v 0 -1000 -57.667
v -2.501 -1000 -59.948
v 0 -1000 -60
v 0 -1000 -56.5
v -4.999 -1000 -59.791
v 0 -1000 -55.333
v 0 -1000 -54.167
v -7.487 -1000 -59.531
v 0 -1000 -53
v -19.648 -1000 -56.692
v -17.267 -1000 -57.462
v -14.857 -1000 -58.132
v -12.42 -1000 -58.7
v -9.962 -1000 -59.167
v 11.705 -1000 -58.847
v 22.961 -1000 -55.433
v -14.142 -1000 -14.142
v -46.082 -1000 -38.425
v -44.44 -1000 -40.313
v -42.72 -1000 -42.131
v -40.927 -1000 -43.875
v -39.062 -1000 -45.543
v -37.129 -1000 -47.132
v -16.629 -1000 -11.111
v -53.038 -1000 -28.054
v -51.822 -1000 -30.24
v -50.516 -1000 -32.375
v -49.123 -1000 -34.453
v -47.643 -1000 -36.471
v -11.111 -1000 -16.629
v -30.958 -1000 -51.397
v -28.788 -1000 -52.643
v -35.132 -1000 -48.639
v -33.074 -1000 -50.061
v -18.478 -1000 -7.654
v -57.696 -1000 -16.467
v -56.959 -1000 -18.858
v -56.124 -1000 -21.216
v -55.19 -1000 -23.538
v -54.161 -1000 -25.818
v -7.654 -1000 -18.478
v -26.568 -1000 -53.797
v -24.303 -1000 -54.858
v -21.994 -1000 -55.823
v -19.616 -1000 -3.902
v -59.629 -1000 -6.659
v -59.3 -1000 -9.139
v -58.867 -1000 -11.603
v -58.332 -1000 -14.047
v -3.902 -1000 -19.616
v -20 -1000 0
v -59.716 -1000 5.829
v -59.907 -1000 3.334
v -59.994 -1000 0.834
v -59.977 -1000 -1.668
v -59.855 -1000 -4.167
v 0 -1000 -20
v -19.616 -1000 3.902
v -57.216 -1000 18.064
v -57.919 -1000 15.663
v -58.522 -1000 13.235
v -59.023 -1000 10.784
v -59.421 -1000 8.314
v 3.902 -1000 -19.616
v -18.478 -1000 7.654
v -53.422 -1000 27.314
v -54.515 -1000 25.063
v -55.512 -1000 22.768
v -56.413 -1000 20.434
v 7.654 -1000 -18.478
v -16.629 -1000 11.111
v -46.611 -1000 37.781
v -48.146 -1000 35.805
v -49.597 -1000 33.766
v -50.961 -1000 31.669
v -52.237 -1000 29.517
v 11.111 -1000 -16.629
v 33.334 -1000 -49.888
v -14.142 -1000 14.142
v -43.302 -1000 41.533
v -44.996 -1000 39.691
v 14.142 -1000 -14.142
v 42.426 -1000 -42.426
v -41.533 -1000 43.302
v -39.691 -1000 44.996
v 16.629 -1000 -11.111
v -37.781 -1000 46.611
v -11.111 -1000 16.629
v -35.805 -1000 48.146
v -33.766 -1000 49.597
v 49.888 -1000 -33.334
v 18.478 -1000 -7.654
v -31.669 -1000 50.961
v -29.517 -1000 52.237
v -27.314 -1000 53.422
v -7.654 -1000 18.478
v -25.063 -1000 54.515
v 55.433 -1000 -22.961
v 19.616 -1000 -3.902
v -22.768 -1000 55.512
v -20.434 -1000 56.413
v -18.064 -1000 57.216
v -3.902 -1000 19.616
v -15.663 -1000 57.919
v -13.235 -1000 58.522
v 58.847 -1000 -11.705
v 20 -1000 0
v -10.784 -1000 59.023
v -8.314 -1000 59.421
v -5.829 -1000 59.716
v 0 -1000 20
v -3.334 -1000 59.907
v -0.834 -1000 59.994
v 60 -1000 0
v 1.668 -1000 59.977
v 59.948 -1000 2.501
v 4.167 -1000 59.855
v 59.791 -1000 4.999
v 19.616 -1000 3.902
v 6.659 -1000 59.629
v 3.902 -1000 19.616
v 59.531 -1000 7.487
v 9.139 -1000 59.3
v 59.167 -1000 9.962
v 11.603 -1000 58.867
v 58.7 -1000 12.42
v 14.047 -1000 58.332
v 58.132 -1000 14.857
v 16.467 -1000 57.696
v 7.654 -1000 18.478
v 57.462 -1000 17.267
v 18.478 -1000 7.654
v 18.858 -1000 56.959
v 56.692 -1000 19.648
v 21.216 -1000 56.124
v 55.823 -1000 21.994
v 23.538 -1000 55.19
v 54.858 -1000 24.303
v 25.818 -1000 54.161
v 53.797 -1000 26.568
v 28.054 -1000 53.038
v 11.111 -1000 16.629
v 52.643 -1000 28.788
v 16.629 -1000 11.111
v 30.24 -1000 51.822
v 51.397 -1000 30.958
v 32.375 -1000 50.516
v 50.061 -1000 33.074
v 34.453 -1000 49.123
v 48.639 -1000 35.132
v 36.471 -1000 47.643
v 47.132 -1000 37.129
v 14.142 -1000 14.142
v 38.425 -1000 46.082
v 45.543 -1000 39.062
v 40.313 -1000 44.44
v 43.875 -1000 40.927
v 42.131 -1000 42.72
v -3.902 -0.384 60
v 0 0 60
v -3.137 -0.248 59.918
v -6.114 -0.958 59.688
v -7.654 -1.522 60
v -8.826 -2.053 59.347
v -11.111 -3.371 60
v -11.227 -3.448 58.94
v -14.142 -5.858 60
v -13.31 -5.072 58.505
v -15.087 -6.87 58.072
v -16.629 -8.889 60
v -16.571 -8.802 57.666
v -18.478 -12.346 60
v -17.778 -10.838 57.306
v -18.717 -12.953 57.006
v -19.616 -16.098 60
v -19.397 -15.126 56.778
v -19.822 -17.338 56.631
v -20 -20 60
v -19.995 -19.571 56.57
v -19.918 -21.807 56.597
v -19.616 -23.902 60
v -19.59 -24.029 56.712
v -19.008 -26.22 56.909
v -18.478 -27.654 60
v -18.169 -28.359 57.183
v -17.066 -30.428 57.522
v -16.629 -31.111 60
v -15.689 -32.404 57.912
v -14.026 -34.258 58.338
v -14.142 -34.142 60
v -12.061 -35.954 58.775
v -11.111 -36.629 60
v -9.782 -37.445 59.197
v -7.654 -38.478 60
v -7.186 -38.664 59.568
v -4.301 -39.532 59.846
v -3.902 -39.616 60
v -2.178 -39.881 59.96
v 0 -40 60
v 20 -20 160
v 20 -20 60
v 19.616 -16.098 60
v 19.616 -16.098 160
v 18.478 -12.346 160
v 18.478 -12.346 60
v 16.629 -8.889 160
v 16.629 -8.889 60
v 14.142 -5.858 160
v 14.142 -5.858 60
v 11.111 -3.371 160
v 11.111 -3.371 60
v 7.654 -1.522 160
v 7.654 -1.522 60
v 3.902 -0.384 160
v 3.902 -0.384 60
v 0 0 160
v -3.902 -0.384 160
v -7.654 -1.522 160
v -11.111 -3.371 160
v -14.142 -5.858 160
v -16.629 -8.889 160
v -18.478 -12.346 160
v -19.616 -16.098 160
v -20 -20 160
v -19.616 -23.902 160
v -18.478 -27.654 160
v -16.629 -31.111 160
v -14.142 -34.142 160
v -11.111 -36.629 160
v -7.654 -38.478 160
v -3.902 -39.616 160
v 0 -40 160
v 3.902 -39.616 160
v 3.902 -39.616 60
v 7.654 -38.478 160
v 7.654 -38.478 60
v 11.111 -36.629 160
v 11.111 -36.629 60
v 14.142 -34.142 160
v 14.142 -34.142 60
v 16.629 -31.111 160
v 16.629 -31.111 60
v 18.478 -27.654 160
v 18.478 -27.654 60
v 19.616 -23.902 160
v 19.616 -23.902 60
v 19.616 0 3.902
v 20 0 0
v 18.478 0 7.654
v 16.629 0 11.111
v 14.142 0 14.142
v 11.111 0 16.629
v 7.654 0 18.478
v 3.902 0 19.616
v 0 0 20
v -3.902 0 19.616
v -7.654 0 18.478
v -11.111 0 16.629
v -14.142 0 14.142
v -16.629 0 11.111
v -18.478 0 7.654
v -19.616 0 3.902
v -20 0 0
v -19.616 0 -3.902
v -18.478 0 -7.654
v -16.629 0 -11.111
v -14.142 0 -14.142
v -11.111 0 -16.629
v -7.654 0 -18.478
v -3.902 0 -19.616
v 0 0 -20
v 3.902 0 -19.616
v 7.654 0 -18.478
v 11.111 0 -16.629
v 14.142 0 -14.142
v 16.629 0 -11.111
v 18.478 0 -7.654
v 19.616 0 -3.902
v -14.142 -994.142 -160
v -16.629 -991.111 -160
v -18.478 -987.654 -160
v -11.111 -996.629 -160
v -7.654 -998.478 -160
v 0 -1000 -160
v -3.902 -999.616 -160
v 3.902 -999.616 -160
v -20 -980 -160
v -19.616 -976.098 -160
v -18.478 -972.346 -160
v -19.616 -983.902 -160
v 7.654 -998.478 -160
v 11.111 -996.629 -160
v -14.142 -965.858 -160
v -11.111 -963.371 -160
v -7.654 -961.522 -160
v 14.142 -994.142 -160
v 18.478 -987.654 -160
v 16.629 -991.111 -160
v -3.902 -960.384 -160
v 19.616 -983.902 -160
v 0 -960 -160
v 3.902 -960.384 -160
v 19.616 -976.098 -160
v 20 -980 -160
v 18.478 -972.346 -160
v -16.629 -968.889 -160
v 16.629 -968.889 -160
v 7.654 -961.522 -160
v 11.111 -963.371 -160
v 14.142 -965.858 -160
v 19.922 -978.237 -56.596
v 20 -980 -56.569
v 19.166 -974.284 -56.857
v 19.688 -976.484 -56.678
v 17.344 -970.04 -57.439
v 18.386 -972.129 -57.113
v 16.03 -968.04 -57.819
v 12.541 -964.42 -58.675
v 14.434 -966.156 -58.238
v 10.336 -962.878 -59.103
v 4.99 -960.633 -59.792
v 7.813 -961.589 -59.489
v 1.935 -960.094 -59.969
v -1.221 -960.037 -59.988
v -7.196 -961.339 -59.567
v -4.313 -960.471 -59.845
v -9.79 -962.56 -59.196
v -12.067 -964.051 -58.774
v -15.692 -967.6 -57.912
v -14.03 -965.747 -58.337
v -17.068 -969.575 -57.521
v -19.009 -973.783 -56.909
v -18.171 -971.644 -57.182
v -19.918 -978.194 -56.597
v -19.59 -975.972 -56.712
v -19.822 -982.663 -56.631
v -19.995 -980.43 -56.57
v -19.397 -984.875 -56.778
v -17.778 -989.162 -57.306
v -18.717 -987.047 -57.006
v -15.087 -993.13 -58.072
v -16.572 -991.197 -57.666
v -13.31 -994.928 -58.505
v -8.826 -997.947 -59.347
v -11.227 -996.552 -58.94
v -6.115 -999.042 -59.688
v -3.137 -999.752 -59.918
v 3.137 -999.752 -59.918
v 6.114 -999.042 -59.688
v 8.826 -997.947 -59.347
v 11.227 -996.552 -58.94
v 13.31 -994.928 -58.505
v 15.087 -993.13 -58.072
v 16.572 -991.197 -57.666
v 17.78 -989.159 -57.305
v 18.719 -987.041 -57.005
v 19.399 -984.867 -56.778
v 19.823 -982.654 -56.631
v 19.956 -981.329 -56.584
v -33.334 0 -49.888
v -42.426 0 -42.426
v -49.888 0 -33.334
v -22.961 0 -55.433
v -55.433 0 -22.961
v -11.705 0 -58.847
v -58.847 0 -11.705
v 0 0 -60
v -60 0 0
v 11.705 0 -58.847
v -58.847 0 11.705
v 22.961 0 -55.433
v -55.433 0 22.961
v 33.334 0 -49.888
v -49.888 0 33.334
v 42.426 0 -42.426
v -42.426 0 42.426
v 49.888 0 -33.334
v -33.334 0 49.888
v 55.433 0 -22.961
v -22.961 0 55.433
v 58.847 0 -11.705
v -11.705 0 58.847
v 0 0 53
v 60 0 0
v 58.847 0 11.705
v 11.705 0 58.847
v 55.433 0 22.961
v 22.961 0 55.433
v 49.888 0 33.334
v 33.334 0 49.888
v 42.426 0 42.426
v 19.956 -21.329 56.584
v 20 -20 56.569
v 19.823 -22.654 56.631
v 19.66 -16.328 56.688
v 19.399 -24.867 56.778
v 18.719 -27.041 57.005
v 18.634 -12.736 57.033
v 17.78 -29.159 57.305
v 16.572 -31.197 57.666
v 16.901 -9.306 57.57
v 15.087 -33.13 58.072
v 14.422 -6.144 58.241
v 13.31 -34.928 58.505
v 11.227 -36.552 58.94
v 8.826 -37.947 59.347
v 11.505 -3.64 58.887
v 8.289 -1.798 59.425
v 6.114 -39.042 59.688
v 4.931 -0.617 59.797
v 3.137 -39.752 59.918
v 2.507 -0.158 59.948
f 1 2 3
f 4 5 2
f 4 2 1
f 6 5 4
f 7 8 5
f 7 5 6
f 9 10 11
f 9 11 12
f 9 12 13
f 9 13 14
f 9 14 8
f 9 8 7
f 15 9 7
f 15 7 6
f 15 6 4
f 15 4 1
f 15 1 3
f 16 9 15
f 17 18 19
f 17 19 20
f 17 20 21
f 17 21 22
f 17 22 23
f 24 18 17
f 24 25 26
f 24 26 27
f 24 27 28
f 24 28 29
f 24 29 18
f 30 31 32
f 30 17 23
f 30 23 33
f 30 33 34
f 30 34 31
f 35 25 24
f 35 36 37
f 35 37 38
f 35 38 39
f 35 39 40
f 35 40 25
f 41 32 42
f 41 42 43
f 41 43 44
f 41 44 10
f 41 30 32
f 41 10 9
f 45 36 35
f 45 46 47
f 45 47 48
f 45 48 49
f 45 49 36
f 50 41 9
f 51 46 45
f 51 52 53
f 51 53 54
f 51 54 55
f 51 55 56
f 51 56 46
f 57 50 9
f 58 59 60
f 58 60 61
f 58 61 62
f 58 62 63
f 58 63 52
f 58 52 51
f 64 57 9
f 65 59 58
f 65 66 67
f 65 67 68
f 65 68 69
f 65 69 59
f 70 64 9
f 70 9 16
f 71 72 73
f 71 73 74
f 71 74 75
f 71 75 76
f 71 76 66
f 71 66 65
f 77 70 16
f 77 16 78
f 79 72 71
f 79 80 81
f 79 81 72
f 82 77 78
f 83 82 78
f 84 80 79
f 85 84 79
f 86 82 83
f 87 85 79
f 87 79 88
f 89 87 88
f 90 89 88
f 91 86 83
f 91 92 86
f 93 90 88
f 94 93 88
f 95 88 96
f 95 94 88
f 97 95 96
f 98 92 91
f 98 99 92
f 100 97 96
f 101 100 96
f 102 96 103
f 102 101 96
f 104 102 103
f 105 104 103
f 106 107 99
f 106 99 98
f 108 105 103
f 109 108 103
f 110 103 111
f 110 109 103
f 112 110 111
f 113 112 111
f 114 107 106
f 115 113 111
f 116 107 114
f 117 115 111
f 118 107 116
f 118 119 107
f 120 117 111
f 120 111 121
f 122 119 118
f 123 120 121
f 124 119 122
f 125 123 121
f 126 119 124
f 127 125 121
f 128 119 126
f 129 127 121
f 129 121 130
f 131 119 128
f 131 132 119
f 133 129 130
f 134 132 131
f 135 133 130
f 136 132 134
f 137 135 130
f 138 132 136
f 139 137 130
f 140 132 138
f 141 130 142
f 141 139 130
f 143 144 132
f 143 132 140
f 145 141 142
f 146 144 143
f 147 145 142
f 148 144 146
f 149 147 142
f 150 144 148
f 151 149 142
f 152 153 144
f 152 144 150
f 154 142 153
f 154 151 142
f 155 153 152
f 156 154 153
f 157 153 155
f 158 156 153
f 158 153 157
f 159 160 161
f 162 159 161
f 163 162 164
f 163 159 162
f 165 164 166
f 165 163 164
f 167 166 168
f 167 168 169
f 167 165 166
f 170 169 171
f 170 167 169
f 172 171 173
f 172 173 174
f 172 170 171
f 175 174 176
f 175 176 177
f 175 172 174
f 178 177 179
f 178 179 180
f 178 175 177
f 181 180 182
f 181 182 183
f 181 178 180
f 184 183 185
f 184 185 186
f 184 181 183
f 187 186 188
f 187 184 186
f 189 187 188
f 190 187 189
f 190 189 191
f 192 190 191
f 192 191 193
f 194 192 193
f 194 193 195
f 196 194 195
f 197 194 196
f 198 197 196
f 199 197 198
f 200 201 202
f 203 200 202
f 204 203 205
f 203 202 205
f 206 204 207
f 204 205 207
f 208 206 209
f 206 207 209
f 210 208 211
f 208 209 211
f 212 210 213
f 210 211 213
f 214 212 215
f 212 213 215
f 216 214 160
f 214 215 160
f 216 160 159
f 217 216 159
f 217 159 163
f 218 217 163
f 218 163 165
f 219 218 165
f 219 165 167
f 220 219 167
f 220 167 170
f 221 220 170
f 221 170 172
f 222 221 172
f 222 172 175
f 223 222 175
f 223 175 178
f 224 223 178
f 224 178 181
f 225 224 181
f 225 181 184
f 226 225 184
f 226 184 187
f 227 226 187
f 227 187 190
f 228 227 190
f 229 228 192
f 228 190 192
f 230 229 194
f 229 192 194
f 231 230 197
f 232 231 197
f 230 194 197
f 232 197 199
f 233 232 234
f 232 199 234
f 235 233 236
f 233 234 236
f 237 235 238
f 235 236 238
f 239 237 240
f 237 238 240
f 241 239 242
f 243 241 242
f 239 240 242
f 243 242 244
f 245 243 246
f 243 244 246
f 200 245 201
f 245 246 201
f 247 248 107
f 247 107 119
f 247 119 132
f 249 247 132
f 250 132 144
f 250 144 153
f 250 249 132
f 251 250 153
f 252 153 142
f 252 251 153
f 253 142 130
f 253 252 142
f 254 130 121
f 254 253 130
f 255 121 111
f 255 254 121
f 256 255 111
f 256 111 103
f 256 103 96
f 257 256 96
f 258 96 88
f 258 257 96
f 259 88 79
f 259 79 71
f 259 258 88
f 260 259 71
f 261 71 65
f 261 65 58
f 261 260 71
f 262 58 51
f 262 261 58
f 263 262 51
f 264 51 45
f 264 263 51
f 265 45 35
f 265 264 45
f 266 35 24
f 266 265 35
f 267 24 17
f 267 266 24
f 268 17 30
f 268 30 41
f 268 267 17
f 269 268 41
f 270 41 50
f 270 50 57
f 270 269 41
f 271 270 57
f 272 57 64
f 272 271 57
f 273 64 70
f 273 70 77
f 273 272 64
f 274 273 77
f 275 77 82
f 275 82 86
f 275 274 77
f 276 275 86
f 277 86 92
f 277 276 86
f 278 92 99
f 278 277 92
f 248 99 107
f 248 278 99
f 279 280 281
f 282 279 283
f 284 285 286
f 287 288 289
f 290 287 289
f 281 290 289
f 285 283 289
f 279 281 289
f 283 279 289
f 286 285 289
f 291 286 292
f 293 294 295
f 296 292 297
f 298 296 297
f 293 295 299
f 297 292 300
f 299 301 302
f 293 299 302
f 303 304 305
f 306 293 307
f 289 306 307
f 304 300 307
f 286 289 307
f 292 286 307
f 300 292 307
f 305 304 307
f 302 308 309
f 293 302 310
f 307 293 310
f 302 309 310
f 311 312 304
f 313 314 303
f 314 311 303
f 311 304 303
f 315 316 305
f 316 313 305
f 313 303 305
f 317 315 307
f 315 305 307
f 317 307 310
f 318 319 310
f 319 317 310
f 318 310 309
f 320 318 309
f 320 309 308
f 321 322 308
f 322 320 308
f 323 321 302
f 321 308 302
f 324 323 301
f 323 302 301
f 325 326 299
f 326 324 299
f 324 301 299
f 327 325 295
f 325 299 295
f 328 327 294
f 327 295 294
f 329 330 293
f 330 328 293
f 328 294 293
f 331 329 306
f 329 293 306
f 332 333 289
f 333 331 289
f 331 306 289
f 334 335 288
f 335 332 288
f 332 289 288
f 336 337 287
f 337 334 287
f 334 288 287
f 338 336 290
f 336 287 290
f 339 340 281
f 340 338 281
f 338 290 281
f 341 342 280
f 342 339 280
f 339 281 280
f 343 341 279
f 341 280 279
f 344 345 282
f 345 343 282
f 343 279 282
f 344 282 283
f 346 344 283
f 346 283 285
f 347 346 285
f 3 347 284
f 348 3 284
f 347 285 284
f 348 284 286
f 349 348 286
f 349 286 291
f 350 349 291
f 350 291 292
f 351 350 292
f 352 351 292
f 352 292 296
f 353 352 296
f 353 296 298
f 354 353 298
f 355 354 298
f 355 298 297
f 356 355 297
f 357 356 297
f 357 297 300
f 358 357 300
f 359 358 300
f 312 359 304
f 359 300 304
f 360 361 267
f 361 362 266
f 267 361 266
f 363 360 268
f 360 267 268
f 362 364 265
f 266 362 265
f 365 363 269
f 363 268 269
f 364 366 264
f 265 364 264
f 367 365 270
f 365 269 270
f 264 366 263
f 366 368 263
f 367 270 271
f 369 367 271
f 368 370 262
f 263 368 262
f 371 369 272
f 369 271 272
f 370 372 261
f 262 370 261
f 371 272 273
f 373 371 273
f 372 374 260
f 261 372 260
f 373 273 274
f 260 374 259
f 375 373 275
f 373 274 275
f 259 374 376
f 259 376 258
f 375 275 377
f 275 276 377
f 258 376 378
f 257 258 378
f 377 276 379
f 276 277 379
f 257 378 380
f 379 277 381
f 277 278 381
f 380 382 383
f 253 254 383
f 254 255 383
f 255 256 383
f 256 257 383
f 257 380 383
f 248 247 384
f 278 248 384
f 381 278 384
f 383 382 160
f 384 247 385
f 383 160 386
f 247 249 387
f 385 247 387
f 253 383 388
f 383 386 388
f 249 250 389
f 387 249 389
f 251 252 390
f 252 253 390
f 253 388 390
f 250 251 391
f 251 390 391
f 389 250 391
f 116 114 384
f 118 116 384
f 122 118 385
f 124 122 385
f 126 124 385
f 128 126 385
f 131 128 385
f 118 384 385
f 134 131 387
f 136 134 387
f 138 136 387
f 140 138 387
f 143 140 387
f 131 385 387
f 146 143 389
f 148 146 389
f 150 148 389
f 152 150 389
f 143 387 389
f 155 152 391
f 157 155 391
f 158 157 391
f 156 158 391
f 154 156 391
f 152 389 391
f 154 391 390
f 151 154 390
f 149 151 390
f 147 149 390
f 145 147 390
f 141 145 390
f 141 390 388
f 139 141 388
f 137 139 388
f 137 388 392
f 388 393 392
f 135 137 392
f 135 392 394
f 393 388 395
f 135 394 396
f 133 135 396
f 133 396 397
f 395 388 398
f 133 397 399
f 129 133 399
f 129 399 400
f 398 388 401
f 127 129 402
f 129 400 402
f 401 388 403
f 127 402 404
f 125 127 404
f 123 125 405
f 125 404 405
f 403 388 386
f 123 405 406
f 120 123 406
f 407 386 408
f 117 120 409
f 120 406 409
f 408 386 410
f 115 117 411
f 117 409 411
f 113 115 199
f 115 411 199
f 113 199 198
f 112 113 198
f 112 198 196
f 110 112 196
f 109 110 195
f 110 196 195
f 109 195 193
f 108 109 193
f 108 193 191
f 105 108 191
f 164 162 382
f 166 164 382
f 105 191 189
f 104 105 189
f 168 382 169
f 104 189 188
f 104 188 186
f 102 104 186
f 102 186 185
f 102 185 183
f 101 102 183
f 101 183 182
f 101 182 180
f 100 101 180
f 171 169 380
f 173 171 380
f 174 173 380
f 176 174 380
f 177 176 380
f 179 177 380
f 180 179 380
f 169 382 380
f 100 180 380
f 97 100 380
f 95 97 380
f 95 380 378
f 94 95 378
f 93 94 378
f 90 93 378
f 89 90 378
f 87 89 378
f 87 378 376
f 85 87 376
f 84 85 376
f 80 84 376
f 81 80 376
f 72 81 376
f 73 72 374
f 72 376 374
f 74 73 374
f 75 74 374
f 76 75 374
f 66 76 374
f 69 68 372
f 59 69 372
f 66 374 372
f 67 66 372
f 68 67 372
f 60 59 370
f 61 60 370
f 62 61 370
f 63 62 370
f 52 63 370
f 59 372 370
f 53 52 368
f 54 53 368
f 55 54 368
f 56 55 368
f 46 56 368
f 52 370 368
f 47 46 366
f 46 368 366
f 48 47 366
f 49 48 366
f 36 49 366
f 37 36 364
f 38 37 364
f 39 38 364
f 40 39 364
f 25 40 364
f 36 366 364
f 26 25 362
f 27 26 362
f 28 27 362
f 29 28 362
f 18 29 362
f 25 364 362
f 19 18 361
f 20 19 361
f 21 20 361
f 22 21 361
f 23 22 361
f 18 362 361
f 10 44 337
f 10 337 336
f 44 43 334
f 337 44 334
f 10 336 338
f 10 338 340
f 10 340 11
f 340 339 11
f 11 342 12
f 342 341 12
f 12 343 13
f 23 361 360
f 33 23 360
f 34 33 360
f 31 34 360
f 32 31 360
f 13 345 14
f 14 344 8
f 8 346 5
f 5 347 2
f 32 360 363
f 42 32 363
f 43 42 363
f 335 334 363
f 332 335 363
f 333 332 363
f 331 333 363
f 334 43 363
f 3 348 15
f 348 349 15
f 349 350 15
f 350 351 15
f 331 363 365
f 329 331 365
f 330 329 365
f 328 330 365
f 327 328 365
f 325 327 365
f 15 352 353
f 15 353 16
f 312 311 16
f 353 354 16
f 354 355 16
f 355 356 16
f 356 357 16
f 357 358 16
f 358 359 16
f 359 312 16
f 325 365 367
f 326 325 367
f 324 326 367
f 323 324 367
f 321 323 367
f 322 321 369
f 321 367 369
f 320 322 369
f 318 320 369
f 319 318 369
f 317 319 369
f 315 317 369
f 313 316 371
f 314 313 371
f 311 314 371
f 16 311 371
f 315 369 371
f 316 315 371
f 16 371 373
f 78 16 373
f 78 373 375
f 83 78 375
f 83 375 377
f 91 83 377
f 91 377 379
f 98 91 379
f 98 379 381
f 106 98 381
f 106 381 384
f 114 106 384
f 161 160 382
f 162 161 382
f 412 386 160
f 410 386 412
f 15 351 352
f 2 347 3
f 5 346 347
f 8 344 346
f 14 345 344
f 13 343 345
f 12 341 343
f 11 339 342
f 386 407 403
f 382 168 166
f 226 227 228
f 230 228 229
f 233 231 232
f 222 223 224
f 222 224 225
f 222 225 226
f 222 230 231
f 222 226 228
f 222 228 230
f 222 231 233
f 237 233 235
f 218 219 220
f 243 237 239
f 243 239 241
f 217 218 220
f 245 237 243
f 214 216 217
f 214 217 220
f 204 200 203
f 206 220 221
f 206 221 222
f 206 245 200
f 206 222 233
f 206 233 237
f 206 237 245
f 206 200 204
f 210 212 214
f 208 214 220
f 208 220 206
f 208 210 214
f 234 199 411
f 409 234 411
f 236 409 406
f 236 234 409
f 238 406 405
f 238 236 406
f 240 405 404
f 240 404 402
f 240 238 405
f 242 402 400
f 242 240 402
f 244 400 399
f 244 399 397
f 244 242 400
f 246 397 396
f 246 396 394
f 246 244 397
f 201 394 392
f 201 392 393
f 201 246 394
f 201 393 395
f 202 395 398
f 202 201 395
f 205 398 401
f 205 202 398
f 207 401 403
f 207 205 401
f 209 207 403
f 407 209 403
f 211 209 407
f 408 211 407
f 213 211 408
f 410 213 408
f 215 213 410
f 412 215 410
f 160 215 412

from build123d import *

# Parameters (mm, degrees)
F0_R          = 60
F0_R_2        = 20
F1_DEPTH      = 1000
F3_R          = 20
F4_DEPTH      = 100
F4_DEPTH_BACK = 7
F6_R          = 20
F7_DEPTH      = 100
F7_DEPTH_BACK = 7


with BuildPart() as f1:
    # F0 (on Front) → F1 (new body)
    with BuildSketch(Plane.XZ):
        Circle(F0_R)
        Circle(F0_R_2, mode=Mode.SUBTRACT)
    extrude(amount=F1_DEPTH)

    # F3 (on offset) → F4 (join, two sides)
    with BuildSketch(Plane.XY.offset(60)) as f4_sk:
        with Locations((0, -20)):
            Circle(F3_R)
    extrude(amount=F4_DEPTH)
    extrude(f4_sk.sketch, amount=-F4_DEPTH_BACK)

    # F6 (on offset) → F7 (join, two sides)
    with BuildSketch(Plane.XY.offset(-60)) as f7_sk:
        with Locations((0, -980)):
            Circle(F6_R)
    extrude(amount=-F7_DEPTH)
    extrude(f7_sk.sketch, amount=F7_DEPTH_BACK)


solid = f1.part
